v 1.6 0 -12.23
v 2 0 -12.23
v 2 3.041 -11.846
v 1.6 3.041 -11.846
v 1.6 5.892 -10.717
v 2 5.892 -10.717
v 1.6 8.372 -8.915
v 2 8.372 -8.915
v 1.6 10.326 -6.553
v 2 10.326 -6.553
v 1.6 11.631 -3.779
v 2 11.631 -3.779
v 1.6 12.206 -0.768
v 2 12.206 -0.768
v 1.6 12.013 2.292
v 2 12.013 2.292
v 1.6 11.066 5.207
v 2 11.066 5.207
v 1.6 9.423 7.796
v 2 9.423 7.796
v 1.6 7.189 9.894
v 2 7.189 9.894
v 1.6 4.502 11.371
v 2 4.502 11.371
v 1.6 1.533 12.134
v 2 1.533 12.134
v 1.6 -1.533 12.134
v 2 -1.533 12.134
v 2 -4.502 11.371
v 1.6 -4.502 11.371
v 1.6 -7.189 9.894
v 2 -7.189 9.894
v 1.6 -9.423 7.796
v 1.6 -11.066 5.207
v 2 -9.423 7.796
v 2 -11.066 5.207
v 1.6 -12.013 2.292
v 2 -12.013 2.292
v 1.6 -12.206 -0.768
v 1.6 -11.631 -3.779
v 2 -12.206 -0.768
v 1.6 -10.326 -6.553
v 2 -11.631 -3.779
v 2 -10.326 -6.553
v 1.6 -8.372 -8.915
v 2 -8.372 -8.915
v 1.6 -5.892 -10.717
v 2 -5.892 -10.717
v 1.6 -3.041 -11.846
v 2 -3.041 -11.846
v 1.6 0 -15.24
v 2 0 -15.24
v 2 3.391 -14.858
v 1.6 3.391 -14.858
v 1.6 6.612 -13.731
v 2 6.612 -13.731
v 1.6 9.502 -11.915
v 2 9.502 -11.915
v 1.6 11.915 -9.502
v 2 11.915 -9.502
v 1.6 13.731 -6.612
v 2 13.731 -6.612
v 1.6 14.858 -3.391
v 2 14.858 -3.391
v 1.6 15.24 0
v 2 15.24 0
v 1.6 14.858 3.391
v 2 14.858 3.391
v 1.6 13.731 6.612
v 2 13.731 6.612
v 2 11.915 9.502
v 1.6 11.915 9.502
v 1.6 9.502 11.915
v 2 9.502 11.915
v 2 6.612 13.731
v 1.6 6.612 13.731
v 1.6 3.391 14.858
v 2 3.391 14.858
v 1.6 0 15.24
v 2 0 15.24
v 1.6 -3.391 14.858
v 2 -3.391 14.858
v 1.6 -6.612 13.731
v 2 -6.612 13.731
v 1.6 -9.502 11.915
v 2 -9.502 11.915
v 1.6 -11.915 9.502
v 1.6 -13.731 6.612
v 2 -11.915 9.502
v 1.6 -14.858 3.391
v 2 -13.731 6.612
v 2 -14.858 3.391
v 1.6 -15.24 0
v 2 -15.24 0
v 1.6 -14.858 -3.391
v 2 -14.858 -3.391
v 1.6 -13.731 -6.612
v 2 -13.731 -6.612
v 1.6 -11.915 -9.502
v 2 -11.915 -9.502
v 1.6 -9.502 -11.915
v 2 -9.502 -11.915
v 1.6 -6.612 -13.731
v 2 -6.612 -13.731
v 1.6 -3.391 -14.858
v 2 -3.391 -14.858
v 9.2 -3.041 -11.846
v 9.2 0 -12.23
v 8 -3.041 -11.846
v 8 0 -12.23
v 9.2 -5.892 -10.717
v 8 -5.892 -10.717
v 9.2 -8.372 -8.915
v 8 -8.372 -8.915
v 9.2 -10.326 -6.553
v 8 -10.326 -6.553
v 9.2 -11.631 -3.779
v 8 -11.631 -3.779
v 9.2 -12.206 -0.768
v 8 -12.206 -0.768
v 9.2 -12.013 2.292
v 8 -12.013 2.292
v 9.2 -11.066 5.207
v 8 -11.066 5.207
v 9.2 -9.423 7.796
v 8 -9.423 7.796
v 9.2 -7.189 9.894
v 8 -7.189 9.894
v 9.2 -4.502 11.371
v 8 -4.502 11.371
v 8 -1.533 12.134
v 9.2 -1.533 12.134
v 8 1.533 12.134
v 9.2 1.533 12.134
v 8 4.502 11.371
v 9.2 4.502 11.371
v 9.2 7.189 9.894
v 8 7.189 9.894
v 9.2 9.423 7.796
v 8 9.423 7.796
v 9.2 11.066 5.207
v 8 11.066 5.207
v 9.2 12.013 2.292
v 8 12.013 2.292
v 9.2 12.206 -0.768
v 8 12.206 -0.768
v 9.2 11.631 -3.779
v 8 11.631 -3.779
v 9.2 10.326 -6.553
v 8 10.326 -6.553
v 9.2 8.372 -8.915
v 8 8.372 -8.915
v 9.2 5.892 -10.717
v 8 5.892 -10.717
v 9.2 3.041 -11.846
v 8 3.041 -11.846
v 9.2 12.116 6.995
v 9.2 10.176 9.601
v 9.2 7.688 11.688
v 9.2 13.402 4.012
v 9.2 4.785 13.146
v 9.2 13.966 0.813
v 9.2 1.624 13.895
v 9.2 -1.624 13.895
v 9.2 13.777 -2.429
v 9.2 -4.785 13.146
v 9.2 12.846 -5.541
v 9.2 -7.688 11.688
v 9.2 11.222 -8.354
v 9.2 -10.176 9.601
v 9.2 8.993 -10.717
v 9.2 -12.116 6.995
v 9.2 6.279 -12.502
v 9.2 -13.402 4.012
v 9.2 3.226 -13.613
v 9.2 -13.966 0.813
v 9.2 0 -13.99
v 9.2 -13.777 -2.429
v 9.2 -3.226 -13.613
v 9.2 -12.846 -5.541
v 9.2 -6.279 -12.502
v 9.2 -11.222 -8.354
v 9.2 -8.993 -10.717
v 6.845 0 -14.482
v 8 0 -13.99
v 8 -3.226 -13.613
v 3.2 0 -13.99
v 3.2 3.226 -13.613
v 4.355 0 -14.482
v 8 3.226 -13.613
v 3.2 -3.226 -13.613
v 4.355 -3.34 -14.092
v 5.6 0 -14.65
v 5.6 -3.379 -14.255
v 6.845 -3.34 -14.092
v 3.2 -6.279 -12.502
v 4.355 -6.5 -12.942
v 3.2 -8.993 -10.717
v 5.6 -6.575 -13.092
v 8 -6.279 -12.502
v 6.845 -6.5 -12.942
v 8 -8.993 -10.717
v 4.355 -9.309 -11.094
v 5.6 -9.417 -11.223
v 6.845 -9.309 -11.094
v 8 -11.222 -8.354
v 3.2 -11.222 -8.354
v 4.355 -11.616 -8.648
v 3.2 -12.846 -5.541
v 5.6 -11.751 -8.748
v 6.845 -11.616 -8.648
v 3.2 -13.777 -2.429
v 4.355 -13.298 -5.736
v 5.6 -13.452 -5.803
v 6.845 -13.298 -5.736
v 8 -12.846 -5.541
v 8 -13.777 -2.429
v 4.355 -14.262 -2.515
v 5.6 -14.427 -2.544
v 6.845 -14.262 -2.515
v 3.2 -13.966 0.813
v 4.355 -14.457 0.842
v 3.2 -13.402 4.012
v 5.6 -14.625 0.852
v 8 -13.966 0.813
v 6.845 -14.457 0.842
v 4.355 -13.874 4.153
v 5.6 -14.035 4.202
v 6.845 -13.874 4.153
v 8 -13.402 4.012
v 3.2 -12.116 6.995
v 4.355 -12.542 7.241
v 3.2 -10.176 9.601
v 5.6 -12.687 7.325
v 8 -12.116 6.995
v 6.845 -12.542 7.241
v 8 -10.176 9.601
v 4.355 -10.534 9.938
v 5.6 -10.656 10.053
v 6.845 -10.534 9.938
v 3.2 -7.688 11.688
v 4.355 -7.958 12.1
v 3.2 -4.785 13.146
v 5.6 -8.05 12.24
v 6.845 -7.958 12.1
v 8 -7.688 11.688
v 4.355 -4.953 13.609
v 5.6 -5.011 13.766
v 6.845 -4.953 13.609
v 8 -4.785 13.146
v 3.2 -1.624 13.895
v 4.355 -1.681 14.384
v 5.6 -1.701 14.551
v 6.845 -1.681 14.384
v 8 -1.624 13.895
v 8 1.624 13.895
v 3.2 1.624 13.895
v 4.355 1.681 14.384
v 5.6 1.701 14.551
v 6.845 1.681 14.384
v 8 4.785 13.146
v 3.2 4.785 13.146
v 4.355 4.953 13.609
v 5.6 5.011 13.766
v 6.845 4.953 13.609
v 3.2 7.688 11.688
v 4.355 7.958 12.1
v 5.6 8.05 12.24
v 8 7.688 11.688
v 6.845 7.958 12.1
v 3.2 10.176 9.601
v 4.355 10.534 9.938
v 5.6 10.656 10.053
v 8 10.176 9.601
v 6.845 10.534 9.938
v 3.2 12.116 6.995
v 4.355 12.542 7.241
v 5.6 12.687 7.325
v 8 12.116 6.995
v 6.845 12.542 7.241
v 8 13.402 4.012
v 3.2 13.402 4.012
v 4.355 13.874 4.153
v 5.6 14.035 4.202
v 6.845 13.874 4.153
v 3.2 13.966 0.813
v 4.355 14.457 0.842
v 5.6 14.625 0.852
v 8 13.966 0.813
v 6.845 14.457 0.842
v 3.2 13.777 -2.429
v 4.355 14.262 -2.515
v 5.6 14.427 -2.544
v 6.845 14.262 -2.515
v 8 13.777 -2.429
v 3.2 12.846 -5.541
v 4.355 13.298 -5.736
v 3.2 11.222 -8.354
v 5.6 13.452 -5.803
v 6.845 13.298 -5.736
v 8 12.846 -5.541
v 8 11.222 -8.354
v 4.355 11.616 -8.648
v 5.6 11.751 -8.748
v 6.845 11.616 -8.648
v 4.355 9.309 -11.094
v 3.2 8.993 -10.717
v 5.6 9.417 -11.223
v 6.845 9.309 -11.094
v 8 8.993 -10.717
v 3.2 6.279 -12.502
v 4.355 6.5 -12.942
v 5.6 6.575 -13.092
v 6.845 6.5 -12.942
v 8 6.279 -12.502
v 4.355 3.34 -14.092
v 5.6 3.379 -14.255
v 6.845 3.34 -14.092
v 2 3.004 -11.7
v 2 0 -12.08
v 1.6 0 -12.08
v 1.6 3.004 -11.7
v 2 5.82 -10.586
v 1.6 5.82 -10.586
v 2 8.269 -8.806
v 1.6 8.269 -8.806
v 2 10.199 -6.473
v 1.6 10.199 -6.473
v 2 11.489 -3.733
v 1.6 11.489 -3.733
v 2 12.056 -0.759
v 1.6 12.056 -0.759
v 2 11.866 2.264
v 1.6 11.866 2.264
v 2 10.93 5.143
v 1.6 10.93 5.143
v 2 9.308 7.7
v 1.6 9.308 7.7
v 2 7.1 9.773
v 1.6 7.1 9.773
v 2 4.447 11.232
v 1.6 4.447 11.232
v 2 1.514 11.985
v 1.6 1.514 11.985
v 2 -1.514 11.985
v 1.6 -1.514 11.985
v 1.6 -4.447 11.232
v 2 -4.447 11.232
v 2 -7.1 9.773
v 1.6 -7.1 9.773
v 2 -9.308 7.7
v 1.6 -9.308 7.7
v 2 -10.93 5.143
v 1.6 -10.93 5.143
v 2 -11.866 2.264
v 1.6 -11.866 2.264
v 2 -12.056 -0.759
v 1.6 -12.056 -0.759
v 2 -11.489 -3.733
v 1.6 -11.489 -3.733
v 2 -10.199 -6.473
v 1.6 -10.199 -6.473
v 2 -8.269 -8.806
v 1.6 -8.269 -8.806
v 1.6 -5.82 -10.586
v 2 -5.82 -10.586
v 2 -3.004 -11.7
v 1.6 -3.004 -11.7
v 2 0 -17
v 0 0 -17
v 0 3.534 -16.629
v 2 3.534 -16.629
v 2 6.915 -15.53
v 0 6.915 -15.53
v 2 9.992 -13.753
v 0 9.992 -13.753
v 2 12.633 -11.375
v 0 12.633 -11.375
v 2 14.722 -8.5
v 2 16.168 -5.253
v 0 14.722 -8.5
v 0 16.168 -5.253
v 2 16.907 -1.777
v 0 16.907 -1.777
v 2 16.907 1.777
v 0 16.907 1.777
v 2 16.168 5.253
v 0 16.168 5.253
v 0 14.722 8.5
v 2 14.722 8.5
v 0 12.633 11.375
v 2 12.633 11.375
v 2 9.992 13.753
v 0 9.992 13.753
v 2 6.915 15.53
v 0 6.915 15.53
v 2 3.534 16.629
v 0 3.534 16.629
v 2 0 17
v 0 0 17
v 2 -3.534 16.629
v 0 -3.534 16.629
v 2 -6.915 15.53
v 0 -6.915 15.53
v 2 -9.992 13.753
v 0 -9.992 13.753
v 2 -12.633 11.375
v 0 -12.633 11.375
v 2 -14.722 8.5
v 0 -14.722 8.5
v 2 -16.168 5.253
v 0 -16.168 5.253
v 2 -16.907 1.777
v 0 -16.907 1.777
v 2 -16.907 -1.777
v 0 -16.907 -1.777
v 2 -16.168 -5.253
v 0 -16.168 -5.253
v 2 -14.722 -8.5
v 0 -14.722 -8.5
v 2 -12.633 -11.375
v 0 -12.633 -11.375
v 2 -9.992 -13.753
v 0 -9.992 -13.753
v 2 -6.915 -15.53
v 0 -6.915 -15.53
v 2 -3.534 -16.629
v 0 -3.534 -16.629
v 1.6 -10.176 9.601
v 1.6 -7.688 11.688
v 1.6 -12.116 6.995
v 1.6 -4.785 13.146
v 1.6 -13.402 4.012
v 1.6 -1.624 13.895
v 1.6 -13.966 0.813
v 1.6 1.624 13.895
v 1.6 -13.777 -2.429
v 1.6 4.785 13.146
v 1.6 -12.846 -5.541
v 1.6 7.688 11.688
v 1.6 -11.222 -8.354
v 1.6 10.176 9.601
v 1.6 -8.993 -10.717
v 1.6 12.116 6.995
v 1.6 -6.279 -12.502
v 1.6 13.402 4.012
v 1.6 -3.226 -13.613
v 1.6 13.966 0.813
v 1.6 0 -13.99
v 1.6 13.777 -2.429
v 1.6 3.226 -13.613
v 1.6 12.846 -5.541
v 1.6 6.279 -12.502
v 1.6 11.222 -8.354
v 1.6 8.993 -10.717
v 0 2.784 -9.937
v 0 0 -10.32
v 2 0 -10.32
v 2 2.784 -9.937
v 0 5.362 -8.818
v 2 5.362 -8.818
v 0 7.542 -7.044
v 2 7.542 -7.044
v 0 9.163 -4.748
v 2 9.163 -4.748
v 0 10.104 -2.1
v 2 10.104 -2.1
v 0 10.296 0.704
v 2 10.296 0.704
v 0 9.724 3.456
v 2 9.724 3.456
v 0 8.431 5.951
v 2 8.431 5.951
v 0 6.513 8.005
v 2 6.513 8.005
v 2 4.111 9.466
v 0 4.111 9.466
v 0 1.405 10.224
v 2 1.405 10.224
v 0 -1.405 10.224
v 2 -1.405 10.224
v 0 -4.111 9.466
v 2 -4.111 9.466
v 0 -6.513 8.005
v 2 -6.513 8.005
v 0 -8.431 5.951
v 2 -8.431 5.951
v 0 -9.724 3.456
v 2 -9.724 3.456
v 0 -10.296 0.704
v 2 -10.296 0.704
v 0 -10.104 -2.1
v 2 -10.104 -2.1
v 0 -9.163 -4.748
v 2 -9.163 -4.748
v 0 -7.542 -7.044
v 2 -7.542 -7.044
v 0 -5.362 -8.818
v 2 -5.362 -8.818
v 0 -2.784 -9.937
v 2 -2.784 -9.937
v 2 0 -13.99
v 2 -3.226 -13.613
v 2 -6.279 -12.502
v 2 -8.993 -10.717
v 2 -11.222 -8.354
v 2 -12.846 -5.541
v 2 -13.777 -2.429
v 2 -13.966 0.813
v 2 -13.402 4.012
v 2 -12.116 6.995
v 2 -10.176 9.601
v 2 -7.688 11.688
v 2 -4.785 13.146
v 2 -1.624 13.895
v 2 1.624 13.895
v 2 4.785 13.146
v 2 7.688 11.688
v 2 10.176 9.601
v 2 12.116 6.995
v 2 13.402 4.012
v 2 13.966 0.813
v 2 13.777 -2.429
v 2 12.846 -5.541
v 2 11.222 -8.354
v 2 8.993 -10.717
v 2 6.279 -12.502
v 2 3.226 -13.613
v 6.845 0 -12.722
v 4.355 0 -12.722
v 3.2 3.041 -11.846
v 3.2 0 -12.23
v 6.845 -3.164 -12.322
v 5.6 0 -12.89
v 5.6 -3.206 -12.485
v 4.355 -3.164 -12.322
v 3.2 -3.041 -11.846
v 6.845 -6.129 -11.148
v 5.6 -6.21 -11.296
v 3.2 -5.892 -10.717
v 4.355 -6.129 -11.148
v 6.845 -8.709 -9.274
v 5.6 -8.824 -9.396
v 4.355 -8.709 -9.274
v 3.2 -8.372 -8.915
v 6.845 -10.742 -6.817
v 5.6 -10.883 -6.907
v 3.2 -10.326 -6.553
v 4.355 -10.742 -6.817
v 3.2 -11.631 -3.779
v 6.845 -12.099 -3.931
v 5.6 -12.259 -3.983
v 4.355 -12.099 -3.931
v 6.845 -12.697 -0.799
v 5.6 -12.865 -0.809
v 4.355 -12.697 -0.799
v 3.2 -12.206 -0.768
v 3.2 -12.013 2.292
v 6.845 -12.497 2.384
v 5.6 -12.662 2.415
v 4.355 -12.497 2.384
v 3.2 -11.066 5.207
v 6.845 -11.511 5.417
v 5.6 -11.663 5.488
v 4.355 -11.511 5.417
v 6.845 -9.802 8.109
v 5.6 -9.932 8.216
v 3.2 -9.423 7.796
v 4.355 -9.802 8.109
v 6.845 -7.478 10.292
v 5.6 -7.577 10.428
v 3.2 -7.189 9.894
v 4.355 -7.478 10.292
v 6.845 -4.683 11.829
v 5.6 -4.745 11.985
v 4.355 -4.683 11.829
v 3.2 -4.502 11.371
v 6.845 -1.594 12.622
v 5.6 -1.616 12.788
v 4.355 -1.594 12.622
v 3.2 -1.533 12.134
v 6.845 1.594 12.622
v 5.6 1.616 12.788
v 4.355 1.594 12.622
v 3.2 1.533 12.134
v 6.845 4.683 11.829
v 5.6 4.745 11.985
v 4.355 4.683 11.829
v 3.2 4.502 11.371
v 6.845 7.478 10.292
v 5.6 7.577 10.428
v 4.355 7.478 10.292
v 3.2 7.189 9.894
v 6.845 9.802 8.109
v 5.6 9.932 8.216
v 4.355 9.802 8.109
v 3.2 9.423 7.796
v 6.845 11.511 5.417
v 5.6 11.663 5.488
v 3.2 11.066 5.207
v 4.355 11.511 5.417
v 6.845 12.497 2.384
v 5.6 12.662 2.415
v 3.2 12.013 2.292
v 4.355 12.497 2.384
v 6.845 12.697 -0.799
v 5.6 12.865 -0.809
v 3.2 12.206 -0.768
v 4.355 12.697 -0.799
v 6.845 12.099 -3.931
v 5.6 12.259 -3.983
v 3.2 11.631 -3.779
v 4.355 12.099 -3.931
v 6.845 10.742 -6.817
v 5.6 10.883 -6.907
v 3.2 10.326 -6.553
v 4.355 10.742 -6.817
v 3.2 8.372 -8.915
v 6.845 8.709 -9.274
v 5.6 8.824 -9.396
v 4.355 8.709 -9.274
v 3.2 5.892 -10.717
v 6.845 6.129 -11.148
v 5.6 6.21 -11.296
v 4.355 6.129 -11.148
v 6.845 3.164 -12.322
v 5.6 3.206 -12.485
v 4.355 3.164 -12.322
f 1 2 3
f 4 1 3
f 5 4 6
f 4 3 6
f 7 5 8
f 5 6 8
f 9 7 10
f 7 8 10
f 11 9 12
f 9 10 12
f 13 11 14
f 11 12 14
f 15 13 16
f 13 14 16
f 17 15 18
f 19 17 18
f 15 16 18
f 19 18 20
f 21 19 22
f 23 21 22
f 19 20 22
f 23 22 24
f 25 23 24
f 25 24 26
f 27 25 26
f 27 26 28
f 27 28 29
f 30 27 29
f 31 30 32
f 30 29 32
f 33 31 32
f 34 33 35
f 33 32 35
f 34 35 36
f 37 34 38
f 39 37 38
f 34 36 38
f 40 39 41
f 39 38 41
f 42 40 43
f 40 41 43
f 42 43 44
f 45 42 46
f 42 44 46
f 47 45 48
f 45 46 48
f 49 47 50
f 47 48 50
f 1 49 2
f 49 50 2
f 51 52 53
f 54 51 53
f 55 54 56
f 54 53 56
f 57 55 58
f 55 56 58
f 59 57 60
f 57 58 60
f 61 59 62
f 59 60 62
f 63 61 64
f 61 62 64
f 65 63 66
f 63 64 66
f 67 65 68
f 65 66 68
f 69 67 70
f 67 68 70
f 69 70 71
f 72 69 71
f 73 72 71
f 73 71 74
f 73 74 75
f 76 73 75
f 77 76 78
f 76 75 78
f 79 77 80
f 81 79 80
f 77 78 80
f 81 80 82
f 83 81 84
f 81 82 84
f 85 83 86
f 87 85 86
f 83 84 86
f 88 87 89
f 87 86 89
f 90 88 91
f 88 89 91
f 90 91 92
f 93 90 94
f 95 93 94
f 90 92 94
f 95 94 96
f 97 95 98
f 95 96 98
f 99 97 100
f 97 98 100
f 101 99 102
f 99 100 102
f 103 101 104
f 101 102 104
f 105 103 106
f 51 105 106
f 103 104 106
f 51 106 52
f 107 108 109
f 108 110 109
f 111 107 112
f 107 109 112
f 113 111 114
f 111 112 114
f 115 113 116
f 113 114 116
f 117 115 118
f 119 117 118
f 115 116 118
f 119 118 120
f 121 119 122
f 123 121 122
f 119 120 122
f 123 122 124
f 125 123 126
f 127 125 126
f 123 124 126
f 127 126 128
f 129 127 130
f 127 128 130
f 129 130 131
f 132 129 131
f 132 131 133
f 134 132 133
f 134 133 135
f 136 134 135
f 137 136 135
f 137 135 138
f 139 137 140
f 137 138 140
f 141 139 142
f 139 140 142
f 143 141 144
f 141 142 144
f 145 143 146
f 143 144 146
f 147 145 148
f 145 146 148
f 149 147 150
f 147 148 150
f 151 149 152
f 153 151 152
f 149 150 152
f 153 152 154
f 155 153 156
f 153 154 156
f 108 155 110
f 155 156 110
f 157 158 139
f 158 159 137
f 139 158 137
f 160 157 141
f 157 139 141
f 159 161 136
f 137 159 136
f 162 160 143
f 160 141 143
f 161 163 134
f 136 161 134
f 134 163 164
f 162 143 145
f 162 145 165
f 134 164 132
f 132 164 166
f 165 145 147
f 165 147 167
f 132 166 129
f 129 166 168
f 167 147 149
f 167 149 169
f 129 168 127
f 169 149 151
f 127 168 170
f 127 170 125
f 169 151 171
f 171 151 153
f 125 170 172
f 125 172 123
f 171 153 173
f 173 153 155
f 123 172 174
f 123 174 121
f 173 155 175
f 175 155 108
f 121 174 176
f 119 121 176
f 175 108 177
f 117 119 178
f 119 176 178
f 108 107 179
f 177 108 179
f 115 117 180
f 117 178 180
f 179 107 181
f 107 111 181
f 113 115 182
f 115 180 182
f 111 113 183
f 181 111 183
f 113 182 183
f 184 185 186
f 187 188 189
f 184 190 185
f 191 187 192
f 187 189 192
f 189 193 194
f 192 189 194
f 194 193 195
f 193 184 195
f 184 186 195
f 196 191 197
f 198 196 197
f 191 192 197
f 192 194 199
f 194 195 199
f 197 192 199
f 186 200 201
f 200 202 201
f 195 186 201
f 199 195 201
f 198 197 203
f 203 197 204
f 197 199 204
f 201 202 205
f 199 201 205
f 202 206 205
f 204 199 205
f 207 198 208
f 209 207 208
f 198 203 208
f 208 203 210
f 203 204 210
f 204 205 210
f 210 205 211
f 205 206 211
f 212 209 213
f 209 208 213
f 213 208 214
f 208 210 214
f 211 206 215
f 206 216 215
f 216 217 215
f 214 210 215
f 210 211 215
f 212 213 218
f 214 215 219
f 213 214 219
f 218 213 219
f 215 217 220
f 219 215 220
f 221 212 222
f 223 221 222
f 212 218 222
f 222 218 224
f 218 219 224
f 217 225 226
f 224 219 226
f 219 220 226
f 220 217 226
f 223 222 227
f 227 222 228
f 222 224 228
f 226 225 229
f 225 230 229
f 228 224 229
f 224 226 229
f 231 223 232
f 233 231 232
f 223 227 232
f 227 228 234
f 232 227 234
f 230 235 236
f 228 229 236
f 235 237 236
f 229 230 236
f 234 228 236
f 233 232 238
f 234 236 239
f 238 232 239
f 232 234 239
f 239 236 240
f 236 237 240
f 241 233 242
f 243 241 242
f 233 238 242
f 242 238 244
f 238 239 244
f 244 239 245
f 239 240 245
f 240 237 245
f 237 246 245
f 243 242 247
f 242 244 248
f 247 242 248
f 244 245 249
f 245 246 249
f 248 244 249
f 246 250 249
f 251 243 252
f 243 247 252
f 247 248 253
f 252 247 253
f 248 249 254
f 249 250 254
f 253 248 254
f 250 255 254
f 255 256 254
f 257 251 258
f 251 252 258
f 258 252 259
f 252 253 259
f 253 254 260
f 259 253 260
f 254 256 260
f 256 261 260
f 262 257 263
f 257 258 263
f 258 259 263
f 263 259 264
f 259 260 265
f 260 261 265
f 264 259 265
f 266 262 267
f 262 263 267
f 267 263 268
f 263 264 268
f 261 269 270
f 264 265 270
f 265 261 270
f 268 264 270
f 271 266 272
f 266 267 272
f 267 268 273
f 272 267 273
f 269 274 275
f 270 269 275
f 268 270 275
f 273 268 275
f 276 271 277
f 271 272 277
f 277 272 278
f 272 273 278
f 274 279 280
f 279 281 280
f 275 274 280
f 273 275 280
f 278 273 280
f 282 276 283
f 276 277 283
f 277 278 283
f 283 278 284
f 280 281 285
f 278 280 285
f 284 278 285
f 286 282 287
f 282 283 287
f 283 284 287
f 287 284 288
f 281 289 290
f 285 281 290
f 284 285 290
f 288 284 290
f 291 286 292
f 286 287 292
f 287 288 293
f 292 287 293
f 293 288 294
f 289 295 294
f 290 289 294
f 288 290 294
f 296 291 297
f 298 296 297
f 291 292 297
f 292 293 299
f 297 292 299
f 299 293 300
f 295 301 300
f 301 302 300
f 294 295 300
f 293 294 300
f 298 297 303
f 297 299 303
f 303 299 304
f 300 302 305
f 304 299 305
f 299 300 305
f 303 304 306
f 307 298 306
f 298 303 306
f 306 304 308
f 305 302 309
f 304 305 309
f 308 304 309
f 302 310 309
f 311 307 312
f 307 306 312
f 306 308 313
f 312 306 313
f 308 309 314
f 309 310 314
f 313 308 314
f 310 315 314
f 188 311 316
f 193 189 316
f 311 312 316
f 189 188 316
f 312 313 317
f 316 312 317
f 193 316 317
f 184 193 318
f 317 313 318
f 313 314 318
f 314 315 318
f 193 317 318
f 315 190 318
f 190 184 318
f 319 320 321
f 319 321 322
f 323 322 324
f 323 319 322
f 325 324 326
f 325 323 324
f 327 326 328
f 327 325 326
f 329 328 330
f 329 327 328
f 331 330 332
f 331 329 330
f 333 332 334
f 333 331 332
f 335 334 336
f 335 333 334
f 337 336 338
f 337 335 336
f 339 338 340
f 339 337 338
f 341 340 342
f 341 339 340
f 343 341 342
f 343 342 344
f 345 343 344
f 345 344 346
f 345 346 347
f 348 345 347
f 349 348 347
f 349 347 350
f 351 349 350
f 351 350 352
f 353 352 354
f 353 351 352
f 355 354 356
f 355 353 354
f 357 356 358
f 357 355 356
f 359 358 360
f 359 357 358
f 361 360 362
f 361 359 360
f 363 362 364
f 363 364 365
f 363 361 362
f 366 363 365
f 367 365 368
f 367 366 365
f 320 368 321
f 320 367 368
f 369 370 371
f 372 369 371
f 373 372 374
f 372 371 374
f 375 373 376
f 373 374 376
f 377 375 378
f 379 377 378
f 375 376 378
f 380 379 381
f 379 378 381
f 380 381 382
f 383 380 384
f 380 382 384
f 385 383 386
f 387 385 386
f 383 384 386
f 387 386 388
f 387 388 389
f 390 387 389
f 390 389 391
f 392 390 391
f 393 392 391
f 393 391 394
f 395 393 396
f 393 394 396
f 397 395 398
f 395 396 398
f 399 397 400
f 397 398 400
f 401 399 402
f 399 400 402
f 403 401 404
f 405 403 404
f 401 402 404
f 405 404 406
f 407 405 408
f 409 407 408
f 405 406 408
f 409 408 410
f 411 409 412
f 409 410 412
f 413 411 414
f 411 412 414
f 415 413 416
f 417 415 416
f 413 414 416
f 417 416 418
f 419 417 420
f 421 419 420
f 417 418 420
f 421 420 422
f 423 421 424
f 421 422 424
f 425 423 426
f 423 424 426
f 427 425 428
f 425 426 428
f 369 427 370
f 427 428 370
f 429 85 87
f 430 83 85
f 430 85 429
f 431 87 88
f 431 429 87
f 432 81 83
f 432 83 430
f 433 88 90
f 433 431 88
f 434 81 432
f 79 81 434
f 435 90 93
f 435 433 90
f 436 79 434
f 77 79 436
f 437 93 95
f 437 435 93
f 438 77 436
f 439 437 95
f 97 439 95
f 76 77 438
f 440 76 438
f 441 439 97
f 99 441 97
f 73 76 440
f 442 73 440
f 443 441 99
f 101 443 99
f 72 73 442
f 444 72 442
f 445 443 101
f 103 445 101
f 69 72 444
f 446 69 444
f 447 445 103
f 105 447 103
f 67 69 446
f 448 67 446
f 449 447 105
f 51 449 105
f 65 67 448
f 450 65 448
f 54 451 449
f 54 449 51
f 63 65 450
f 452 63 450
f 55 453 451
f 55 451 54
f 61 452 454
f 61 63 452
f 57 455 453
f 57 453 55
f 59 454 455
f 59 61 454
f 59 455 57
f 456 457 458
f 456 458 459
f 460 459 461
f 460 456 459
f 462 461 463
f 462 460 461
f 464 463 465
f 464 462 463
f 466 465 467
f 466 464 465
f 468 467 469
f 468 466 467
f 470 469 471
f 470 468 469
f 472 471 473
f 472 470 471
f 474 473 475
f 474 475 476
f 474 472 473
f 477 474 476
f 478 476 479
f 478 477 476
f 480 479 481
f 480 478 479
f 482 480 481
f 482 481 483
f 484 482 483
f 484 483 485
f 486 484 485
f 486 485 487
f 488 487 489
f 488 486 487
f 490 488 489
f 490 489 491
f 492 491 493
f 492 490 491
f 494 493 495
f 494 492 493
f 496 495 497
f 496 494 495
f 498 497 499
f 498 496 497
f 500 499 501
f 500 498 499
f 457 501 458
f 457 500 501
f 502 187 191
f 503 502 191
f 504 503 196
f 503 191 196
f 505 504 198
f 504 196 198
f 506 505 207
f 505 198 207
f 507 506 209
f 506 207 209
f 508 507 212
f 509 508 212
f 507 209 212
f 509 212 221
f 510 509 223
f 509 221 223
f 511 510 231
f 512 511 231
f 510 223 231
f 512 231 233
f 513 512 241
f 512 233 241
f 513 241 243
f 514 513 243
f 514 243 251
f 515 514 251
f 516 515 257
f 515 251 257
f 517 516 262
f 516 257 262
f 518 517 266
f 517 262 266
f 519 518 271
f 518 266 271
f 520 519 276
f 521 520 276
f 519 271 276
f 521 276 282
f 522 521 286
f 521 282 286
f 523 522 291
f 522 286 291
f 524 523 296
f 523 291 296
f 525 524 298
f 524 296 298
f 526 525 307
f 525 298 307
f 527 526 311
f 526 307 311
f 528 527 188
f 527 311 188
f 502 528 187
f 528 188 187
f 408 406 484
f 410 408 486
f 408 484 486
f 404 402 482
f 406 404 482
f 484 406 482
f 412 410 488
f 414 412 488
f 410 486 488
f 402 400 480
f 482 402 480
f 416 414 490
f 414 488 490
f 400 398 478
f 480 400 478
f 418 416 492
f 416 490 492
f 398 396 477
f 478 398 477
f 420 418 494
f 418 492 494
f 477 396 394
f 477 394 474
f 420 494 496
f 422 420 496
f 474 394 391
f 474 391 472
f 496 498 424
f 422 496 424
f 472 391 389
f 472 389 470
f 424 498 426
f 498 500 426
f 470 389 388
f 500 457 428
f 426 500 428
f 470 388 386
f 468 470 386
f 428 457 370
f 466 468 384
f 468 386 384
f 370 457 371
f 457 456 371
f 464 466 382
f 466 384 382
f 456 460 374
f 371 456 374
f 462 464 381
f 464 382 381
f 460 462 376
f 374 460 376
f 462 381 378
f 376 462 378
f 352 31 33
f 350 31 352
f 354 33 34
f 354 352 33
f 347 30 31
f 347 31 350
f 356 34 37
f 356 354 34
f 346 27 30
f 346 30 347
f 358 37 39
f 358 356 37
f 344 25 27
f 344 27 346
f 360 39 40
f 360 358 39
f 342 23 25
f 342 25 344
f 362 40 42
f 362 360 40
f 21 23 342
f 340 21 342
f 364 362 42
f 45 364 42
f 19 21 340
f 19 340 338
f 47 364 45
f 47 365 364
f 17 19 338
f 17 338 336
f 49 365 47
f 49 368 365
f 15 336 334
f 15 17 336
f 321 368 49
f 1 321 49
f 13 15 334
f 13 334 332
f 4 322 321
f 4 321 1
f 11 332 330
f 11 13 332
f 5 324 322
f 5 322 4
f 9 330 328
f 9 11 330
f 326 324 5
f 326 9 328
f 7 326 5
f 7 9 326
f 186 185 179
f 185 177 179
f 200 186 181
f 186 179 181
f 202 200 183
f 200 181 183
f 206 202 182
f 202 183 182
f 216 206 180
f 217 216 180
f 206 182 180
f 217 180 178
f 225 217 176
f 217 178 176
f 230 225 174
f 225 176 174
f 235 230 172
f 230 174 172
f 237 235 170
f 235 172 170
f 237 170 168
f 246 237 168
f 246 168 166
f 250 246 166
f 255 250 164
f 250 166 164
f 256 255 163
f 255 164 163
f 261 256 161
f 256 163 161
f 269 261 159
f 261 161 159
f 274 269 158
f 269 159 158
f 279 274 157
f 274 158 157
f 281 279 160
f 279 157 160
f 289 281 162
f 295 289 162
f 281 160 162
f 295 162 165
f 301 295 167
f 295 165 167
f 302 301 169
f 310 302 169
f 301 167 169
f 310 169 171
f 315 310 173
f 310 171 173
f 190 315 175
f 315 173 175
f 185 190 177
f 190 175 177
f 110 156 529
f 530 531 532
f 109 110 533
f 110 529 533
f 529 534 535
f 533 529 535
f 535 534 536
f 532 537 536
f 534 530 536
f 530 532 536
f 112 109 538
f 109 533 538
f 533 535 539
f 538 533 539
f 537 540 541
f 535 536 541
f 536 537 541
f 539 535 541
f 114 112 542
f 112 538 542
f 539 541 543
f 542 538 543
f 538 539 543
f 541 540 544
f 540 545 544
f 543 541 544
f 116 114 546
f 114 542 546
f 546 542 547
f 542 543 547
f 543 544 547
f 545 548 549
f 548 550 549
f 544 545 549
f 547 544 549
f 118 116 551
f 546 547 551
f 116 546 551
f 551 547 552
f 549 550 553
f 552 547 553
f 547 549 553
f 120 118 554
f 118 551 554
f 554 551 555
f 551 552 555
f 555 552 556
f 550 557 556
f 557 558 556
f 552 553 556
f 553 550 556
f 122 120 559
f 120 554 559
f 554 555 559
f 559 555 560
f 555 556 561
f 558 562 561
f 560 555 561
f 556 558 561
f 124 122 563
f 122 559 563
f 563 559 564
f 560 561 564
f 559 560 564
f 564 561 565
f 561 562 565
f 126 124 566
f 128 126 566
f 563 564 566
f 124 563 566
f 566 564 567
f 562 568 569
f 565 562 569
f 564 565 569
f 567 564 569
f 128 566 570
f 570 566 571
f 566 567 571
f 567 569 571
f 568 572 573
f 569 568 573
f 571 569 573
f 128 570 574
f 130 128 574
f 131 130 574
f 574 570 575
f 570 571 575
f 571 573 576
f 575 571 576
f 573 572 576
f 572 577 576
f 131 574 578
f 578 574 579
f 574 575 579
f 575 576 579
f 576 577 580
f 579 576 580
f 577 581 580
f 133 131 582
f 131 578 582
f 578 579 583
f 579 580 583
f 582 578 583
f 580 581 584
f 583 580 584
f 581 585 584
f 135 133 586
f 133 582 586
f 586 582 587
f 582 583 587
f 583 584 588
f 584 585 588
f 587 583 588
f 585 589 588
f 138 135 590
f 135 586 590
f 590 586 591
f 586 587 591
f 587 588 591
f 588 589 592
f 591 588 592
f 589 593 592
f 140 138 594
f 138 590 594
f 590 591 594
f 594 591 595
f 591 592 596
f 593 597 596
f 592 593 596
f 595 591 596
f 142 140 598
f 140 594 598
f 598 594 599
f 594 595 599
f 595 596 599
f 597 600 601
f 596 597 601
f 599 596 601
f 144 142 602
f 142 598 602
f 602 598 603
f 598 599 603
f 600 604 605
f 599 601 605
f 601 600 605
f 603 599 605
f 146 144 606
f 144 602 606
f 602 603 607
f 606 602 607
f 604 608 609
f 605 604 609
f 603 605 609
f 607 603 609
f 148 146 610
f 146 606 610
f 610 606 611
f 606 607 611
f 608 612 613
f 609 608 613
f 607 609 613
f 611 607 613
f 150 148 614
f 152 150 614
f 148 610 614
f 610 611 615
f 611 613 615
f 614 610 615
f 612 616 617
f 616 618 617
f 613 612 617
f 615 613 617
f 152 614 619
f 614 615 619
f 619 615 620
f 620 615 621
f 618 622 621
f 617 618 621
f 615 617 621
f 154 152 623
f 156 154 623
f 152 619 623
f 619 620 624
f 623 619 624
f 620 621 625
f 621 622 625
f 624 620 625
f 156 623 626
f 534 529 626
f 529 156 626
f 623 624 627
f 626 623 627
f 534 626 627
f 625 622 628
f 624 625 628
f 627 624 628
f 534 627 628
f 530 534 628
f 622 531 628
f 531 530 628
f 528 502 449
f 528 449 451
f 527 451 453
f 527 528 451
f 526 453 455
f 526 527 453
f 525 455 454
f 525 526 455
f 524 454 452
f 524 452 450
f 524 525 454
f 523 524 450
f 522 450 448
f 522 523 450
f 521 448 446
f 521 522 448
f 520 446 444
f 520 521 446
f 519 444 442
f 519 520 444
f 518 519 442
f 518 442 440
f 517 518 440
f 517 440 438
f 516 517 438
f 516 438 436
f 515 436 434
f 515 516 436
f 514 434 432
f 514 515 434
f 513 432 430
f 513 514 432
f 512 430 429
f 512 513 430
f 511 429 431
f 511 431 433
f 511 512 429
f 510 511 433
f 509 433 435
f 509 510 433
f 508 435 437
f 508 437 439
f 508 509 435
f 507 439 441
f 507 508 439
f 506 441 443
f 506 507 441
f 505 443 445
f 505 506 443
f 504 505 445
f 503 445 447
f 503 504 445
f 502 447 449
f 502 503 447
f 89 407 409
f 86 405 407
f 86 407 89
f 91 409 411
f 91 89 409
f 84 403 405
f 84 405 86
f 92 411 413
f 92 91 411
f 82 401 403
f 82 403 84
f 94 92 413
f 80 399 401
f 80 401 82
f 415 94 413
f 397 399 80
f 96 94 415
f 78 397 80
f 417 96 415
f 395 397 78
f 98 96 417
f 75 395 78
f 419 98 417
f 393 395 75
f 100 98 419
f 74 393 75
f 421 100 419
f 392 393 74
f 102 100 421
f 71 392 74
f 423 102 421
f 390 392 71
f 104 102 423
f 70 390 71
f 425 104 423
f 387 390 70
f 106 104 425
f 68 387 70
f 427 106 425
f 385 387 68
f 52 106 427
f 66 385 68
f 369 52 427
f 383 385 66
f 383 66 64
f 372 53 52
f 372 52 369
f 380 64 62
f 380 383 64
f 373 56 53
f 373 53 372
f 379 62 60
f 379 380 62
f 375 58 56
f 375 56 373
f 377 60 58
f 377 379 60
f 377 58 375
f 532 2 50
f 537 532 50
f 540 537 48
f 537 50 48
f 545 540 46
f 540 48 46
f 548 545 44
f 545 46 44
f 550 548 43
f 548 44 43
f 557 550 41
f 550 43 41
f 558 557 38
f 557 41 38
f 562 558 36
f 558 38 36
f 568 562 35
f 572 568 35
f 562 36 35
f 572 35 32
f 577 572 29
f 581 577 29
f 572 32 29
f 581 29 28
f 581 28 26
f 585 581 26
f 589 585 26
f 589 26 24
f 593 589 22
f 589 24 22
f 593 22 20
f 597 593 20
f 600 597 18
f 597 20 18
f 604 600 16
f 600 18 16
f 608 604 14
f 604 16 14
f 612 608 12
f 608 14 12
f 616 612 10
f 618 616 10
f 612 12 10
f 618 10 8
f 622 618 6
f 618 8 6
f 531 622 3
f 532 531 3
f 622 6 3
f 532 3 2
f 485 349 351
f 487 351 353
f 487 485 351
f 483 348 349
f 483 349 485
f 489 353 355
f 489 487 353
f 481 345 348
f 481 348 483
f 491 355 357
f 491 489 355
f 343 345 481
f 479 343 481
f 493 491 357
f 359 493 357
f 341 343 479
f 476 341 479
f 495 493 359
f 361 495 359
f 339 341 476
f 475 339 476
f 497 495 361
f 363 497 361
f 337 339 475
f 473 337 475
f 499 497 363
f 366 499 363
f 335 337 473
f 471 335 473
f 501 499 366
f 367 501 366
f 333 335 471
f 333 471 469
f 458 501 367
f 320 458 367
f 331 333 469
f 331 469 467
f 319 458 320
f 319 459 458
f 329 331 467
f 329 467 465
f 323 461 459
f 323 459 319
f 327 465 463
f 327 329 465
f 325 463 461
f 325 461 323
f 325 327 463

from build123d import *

# Parameters (mm, degrees)
SKETCH1_R           = 17
SKETCH1_R_2         = 10.32
BOSS_EXTRUDE1_DEPTH = 2
SKETCH5_R           = 15.24
SKETCH5_R_2         = 13.99
CUT_EXTRUDE1_DEPTH  = 0.4
SKETCH6_R           = 12.23
SKETCH6_R_2         = 12.08
CUT_EXTRUDE2_DEPTH  = 0.4


with BuildPart() as part:
    # Sketch1 → Boss-Extrude1 (new body)
    with BuildSketch(Plane(origin=(0, 0, 0), x_dir=(0, 0, -1), z_dir=(1, 0, 0))):
        Circle(SKETCH1_R)
        Circle(SKETCH1_R_2, mode=Mode.SUBTRACT)
    extrude(amount=BOSS_EXTRUDE1_DEPTH)

    # Sketch4 → Revolve3 (revolve)
    with BuildSketch(Plane(origin=(0, 0, 0), x_dir=(1, 0, 0), z_dir=(0, 1, 0))):
        with BuildLine():
            Line((9.2, 13.99), (9.2, 12.23))
            Line((9.2, 12.23), (8, 12.23))
            ThreePointArc((8, 12.23), (5.6, 12.89), (3.2, 12.23))
            Line((3.2, 12.23), (2, 12.23))
            Line((2, 12.23), (2, 13.99))
            Line((2, 13.99), (3.199999942, 13.99))
            ThreePointArc((3.199999942, 13.99), (5.599998351, 14.65), (7.999996761, 13.99))
            Line((7.999996761, 13.99), (9.2, 13.99))
        make_face()
    revolve(axis=Axis((2, 0, 0), (-1, 0, 0)))

    # Sketch5 → Cut-Extrude1 (cut)
    with BuildSketch(Plane(origin=(2, 0, 0), x_dir=(0, 0, -1), z_dir=(1, 0, 0))):
        Circle(SKETCH5_R)
        Circle(SKETCH5_R_2, mode=Mode.SUBTRACT)
    extrude(amount=-CUT_EXTRUDE1_DEPTH, mode=Mode.SUBTRACT)

    # Sketch6 → Cut-Extrude2 (cut)
    with BuildSketch(Plane(origin=(2, 0, 0), x_dir=(0, 0, -1), z_dir=(1, 0, 0))):
        Circle(SKETCH6_R)
        Circle(SKETCH6_R_2, mode=Mode.SUBTRACT)
    extrude(amount=-CUT_EXTRUDE2_DEPTH, mode=Mode.SUBTRACT)


solid = part.part
